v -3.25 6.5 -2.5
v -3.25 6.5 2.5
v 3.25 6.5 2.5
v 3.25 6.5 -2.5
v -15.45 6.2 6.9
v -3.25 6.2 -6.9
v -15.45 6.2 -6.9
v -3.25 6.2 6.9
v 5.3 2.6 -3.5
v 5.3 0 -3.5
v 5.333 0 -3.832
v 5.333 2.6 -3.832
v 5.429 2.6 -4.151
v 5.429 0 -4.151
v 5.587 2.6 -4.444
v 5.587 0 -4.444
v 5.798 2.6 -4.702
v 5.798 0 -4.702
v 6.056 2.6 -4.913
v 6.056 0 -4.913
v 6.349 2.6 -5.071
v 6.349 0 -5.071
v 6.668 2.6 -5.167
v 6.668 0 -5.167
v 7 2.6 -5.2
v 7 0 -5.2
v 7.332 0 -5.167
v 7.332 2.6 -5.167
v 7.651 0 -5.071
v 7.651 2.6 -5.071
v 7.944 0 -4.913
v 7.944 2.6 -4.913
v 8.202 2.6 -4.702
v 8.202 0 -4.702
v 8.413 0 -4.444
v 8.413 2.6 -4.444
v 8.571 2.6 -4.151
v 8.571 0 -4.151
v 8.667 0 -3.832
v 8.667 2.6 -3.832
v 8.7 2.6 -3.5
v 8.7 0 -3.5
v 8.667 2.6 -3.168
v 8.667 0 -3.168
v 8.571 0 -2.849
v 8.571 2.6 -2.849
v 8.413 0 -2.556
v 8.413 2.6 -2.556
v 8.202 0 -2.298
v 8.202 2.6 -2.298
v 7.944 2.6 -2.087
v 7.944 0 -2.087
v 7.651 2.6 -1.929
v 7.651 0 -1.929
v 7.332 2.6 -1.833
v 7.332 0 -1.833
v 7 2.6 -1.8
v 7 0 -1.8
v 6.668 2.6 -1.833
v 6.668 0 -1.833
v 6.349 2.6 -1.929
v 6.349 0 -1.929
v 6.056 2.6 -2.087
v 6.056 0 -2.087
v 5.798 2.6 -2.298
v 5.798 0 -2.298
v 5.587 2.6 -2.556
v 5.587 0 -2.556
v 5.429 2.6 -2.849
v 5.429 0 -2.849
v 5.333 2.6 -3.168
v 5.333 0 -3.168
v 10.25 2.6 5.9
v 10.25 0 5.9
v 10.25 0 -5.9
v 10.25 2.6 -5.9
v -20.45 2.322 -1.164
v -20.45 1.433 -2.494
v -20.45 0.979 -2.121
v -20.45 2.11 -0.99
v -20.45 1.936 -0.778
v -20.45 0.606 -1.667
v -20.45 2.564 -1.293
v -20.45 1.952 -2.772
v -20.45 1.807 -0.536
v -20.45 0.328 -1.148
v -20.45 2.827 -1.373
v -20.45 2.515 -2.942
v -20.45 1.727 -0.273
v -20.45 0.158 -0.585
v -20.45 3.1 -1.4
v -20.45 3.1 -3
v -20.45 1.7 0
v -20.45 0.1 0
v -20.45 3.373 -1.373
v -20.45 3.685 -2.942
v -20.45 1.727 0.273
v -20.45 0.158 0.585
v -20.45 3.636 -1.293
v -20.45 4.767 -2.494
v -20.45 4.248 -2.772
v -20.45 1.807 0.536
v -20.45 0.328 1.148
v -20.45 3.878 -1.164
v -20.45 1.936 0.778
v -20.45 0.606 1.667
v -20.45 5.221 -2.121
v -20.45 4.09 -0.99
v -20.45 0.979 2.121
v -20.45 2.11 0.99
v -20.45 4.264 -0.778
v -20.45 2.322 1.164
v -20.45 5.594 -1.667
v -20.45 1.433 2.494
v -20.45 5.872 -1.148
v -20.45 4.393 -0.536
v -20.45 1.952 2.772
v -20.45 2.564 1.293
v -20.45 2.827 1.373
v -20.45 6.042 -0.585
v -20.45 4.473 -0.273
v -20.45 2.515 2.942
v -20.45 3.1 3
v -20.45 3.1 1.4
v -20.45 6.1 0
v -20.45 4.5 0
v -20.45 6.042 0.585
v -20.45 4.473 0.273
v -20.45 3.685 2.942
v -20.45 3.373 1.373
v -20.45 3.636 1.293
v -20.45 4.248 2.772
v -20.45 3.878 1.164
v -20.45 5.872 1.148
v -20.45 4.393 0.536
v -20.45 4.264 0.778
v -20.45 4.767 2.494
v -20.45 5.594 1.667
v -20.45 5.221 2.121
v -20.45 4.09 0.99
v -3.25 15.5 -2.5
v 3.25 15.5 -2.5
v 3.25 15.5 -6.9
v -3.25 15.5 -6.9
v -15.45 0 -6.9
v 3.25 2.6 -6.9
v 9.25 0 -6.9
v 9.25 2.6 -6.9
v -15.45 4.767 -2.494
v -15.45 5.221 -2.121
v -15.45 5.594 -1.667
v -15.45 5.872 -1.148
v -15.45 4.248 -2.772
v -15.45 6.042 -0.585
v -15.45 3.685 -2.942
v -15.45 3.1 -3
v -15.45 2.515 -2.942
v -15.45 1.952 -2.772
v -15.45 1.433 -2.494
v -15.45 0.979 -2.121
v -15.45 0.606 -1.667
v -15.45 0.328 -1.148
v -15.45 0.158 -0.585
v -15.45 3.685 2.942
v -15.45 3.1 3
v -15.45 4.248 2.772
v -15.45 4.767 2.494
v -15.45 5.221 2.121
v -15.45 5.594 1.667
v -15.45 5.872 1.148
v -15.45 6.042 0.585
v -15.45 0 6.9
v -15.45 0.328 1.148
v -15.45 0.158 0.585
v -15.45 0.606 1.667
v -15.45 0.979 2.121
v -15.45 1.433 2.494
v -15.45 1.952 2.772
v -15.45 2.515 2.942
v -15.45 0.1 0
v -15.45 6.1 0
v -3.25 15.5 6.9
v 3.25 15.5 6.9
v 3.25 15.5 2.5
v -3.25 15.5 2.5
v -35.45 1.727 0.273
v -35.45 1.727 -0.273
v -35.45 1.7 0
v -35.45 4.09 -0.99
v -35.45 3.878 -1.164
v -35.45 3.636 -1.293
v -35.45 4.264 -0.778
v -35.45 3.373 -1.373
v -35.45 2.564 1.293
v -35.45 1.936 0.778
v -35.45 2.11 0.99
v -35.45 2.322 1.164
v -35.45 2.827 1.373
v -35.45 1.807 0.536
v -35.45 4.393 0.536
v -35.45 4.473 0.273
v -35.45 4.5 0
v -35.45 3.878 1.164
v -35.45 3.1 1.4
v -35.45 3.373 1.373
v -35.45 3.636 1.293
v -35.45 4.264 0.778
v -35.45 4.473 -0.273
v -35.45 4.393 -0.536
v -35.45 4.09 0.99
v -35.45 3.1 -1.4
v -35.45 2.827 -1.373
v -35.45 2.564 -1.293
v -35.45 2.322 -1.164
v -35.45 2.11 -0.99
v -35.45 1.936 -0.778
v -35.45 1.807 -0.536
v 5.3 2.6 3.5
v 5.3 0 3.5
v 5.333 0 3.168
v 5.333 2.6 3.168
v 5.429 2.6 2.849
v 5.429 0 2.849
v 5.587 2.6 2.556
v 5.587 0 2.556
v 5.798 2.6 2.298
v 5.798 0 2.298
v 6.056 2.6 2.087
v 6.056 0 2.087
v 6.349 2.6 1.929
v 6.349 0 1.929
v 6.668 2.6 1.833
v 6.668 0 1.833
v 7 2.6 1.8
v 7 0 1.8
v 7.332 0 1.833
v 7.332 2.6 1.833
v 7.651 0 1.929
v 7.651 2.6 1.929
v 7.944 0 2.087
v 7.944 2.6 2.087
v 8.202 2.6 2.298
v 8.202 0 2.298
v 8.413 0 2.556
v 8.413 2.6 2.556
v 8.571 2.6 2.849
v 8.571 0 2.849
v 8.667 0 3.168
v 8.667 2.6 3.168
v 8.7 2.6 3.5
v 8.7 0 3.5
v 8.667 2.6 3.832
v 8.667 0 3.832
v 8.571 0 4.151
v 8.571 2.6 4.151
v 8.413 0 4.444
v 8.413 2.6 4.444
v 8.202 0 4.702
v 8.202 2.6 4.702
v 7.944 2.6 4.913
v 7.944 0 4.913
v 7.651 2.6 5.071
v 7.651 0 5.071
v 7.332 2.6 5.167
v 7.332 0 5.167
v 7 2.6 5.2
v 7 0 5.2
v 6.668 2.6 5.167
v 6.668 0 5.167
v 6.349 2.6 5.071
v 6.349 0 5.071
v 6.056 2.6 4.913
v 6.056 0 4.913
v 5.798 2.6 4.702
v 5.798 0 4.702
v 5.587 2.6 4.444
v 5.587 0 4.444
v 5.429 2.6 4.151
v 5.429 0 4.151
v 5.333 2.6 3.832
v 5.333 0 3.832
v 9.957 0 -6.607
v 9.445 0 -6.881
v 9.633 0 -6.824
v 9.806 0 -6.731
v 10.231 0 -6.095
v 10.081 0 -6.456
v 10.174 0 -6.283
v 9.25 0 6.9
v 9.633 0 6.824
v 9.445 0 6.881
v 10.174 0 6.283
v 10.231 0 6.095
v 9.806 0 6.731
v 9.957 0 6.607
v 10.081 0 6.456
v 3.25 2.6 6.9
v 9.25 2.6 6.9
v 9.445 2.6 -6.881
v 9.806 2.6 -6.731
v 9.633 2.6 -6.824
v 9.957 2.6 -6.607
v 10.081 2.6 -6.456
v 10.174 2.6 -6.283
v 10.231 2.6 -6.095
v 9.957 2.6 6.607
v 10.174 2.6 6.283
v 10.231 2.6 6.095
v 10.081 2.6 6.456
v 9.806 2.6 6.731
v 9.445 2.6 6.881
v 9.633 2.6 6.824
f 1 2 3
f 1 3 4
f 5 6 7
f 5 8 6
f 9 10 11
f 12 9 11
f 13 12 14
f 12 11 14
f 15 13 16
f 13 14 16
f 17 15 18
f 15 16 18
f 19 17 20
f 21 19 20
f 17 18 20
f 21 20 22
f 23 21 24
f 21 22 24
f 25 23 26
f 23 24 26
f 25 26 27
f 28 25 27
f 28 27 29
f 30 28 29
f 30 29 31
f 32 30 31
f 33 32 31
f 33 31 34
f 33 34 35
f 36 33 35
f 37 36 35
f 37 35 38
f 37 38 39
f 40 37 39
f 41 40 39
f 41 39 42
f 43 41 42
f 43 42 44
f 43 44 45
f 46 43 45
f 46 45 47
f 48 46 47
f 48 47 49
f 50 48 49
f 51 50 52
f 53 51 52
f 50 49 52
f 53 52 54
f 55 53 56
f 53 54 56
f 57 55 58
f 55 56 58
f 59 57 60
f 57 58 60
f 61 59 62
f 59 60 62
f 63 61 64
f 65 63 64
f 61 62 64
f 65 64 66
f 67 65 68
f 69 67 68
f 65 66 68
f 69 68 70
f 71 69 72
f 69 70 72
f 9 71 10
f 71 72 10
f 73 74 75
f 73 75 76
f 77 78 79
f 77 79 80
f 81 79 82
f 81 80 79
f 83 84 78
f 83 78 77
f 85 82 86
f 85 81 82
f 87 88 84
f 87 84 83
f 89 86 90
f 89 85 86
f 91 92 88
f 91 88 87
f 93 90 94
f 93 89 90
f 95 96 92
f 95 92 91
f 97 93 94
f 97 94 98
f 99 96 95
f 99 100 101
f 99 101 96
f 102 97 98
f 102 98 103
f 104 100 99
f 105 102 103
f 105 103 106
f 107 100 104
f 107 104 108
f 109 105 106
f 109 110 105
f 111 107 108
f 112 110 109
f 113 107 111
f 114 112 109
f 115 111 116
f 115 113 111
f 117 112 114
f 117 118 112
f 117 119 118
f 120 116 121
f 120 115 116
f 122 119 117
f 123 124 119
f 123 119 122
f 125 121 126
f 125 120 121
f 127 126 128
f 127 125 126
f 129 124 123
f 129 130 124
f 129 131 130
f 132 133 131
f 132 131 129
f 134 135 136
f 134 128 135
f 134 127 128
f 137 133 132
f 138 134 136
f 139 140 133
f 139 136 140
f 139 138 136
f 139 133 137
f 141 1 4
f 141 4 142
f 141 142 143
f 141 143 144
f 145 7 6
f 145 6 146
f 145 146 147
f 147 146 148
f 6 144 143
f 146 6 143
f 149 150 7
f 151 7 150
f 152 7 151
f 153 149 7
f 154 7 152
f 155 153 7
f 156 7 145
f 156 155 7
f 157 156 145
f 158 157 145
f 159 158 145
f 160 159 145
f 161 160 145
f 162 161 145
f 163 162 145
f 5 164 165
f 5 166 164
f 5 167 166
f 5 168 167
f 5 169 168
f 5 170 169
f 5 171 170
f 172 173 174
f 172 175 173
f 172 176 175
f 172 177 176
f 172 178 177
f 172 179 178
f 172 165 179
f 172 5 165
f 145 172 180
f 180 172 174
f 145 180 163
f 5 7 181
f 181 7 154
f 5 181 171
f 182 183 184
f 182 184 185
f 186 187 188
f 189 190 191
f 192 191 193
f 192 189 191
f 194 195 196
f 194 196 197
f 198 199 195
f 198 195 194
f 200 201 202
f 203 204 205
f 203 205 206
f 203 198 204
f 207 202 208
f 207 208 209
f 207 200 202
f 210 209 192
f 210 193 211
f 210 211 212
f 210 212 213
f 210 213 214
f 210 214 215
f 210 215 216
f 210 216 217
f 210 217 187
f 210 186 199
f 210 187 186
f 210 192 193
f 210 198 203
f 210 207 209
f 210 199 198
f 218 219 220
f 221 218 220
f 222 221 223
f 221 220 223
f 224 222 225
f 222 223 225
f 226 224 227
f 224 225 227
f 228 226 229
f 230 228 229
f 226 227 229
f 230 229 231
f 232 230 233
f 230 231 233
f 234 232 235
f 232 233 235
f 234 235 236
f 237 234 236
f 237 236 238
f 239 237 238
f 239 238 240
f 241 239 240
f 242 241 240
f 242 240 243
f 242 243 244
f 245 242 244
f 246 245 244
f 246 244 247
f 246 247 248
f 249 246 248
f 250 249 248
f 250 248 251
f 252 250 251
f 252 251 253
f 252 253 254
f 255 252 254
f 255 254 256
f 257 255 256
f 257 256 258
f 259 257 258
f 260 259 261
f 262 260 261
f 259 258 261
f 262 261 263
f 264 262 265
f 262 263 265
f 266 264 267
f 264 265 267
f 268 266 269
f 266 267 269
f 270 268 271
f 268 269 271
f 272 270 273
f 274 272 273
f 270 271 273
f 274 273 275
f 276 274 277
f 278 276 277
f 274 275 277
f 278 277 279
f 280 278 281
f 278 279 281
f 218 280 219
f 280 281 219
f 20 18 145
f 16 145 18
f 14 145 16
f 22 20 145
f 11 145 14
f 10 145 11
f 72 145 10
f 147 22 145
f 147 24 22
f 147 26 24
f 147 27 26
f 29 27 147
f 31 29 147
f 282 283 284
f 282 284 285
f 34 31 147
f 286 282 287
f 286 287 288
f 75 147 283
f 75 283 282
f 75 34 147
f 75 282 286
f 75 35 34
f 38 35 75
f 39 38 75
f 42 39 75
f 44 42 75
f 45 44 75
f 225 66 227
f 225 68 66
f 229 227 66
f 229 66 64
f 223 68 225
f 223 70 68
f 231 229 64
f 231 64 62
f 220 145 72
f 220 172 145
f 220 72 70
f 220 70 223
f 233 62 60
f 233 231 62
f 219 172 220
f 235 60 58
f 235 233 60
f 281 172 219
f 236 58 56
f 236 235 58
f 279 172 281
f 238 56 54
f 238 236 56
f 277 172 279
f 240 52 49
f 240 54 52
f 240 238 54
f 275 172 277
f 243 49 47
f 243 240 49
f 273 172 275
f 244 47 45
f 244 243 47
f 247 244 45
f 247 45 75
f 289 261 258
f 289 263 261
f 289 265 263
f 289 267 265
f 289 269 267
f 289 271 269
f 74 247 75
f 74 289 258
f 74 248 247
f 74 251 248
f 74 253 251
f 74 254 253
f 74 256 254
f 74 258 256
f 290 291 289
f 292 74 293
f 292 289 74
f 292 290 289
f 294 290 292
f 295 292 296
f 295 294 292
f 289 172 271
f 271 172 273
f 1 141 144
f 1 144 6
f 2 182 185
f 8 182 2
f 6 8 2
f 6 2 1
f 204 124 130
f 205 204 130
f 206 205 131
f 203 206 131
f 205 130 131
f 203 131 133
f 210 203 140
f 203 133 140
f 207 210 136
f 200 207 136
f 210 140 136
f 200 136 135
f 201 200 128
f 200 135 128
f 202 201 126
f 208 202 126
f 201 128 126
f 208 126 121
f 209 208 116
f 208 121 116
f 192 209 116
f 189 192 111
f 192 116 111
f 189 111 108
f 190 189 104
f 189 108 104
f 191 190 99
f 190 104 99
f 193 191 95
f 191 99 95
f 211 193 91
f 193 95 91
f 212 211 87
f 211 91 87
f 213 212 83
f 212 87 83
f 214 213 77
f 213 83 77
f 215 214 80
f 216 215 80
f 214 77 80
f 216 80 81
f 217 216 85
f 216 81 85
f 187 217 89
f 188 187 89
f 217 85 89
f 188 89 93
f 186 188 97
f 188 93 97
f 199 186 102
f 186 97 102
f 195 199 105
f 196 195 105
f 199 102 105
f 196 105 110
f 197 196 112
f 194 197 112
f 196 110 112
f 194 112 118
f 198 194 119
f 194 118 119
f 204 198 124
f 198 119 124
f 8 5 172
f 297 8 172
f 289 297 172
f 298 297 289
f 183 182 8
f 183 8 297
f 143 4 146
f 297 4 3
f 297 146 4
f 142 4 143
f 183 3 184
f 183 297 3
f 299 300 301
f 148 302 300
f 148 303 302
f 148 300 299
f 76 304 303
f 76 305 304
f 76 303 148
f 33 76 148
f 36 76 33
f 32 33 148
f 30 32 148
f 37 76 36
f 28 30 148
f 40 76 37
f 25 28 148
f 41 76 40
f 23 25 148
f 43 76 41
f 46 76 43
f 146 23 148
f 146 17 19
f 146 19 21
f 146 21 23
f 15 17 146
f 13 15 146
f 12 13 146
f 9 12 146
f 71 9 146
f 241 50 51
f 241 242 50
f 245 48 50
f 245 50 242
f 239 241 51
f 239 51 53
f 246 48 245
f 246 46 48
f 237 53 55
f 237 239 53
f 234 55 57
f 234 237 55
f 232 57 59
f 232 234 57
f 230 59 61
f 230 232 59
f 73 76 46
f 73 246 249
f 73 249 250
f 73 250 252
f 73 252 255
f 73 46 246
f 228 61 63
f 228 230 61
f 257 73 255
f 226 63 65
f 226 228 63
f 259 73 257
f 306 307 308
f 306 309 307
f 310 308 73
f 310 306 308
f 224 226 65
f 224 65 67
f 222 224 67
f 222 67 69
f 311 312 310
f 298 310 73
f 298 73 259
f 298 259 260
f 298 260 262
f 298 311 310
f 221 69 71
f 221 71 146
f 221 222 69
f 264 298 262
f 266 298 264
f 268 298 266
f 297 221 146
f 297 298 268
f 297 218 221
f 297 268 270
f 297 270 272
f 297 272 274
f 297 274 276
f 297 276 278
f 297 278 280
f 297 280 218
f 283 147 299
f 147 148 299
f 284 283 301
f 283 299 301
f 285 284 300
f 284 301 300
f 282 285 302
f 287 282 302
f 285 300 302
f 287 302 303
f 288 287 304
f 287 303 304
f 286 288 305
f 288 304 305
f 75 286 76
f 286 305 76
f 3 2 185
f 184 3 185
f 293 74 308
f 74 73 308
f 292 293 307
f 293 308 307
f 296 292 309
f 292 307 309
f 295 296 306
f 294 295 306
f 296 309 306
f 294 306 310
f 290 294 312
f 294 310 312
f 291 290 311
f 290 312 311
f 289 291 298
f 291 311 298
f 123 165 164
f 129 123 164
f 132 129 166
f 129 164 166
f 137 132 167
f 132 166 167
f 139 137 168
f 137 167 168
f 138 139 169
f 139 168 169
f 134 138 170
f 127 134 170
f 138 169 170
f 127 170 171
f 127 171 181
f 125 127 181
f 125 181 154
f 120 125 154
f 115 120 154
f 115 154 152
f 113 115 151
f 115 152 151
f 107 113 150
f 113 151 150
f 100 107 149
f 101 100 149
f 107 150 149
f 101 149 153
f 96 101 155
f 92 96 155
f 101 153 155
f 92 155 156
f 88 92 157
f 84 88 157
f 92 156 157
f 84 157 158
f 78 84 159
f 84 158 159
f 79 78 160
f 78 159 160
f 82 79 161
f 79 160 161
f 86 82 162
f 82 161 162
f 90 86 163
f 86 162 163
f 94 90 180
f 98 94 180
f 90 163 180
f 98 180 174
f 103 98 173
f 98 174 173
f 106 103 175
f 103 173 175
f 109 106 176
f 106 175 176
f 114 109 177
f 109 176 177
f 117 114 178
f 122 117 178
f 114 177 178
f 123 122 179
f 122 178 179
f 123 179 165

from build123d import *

# Parameters (mm, degrees)
BOSS_EXTRU_1_DEPTH           = 6.9
ENL_V_MAT_EXTRU_1_DEPTH      = 23.946949688
ENL_V_MAT_EXTRU_1_DEPTH_BACK = 23.946949688
ESQUISSE2_W                  = 5
ESQUISSE2_H                  = 9
D_GAGEMENT_M31_D             = 3.4
ESQUISSE5_R                  = 3
BOSS_EXTRU_2_DEPTH           = 5
ESQUISSE6_R                  = 1.4
BOSS_EXTRU_3_DEPTH           = 15
CONG_1_R                     = 1


with BuildPart() as part:
    # Esquisse1 → Boss.-Extru.1 (new, symmetric)
    with BuildSketch(Plane.XY):
        Polygon((-15.45, 0), (10.25, 0), (10.25, 2.6), (3.25, 2.6), (3.25, 15.5), (-3.25, 15.5), (-3.25, 6.2), (-15.45, 6.2), align=None)
    extrude(amount=BOSS_EXTRU_1_DEPTH, both=True)

    # Esquisse2 → Enlèv. mat.-Extru.1 (cut, two sides: drawn at the far end of the back side and taken through both)
    with BuildSketch(Plane(origin=(0, 0, 0), x_dir=(0, 0, -1), z_dir=(1, 0, 0)).offset(-ENL_V_MAT_EXTRU_1_DEPTH_BACK)):
        with Locations((0, 11)):
            Rectangle(ESQUISSE2_W, ESQUISSE2_H)
    extrude(amount=ENL_V_MAT_EXTRU_1_DEPTH + ENL_V_MAT_EXTRU_1_DEPTH_BACK, mode=Mode.SUBTRACT)

    # Dégagement M31 (through all)
    with Locations(Plane(origin=(0, 2.6, 0), x_dir=(1, 0, 0), z_dir=(0, 1, 0))):
        with Locations((7, 3.5), (7, -3.5)):
            Hole(D_GAGEMENT_M31_D / 2)

    # Esquisse5 → Boss.-Extru.2 (add)
    with BuildSketch(Plane.ZY.offset(15.45)):
        with Locations((0, 3.1)):
            Circle(ESQUISSE5_R)
    extrude(amount=BOSS_EXTRU_2_DEPTH)

    # Esquisse6 → Boss.-Extru.3 (add)
    with BuildSketch(Plane.ZY.offset(20.45)):
        with Locations((0, 3.1)):
            Circle(ESQUISSE6_R)
    extrude(amount=BOSS_EXTRU_3_DEPTH)

    # Congé1
    cong_1_edges = [part.edges().sort_by_distance(p)[0] for p in [
        (10.25, 1.3, -6.9),
        (10.25, 1.3, 6.9),
    ]]
    fillet(cong_1_edges, radius=CONG_1_R)


solid = part.part
